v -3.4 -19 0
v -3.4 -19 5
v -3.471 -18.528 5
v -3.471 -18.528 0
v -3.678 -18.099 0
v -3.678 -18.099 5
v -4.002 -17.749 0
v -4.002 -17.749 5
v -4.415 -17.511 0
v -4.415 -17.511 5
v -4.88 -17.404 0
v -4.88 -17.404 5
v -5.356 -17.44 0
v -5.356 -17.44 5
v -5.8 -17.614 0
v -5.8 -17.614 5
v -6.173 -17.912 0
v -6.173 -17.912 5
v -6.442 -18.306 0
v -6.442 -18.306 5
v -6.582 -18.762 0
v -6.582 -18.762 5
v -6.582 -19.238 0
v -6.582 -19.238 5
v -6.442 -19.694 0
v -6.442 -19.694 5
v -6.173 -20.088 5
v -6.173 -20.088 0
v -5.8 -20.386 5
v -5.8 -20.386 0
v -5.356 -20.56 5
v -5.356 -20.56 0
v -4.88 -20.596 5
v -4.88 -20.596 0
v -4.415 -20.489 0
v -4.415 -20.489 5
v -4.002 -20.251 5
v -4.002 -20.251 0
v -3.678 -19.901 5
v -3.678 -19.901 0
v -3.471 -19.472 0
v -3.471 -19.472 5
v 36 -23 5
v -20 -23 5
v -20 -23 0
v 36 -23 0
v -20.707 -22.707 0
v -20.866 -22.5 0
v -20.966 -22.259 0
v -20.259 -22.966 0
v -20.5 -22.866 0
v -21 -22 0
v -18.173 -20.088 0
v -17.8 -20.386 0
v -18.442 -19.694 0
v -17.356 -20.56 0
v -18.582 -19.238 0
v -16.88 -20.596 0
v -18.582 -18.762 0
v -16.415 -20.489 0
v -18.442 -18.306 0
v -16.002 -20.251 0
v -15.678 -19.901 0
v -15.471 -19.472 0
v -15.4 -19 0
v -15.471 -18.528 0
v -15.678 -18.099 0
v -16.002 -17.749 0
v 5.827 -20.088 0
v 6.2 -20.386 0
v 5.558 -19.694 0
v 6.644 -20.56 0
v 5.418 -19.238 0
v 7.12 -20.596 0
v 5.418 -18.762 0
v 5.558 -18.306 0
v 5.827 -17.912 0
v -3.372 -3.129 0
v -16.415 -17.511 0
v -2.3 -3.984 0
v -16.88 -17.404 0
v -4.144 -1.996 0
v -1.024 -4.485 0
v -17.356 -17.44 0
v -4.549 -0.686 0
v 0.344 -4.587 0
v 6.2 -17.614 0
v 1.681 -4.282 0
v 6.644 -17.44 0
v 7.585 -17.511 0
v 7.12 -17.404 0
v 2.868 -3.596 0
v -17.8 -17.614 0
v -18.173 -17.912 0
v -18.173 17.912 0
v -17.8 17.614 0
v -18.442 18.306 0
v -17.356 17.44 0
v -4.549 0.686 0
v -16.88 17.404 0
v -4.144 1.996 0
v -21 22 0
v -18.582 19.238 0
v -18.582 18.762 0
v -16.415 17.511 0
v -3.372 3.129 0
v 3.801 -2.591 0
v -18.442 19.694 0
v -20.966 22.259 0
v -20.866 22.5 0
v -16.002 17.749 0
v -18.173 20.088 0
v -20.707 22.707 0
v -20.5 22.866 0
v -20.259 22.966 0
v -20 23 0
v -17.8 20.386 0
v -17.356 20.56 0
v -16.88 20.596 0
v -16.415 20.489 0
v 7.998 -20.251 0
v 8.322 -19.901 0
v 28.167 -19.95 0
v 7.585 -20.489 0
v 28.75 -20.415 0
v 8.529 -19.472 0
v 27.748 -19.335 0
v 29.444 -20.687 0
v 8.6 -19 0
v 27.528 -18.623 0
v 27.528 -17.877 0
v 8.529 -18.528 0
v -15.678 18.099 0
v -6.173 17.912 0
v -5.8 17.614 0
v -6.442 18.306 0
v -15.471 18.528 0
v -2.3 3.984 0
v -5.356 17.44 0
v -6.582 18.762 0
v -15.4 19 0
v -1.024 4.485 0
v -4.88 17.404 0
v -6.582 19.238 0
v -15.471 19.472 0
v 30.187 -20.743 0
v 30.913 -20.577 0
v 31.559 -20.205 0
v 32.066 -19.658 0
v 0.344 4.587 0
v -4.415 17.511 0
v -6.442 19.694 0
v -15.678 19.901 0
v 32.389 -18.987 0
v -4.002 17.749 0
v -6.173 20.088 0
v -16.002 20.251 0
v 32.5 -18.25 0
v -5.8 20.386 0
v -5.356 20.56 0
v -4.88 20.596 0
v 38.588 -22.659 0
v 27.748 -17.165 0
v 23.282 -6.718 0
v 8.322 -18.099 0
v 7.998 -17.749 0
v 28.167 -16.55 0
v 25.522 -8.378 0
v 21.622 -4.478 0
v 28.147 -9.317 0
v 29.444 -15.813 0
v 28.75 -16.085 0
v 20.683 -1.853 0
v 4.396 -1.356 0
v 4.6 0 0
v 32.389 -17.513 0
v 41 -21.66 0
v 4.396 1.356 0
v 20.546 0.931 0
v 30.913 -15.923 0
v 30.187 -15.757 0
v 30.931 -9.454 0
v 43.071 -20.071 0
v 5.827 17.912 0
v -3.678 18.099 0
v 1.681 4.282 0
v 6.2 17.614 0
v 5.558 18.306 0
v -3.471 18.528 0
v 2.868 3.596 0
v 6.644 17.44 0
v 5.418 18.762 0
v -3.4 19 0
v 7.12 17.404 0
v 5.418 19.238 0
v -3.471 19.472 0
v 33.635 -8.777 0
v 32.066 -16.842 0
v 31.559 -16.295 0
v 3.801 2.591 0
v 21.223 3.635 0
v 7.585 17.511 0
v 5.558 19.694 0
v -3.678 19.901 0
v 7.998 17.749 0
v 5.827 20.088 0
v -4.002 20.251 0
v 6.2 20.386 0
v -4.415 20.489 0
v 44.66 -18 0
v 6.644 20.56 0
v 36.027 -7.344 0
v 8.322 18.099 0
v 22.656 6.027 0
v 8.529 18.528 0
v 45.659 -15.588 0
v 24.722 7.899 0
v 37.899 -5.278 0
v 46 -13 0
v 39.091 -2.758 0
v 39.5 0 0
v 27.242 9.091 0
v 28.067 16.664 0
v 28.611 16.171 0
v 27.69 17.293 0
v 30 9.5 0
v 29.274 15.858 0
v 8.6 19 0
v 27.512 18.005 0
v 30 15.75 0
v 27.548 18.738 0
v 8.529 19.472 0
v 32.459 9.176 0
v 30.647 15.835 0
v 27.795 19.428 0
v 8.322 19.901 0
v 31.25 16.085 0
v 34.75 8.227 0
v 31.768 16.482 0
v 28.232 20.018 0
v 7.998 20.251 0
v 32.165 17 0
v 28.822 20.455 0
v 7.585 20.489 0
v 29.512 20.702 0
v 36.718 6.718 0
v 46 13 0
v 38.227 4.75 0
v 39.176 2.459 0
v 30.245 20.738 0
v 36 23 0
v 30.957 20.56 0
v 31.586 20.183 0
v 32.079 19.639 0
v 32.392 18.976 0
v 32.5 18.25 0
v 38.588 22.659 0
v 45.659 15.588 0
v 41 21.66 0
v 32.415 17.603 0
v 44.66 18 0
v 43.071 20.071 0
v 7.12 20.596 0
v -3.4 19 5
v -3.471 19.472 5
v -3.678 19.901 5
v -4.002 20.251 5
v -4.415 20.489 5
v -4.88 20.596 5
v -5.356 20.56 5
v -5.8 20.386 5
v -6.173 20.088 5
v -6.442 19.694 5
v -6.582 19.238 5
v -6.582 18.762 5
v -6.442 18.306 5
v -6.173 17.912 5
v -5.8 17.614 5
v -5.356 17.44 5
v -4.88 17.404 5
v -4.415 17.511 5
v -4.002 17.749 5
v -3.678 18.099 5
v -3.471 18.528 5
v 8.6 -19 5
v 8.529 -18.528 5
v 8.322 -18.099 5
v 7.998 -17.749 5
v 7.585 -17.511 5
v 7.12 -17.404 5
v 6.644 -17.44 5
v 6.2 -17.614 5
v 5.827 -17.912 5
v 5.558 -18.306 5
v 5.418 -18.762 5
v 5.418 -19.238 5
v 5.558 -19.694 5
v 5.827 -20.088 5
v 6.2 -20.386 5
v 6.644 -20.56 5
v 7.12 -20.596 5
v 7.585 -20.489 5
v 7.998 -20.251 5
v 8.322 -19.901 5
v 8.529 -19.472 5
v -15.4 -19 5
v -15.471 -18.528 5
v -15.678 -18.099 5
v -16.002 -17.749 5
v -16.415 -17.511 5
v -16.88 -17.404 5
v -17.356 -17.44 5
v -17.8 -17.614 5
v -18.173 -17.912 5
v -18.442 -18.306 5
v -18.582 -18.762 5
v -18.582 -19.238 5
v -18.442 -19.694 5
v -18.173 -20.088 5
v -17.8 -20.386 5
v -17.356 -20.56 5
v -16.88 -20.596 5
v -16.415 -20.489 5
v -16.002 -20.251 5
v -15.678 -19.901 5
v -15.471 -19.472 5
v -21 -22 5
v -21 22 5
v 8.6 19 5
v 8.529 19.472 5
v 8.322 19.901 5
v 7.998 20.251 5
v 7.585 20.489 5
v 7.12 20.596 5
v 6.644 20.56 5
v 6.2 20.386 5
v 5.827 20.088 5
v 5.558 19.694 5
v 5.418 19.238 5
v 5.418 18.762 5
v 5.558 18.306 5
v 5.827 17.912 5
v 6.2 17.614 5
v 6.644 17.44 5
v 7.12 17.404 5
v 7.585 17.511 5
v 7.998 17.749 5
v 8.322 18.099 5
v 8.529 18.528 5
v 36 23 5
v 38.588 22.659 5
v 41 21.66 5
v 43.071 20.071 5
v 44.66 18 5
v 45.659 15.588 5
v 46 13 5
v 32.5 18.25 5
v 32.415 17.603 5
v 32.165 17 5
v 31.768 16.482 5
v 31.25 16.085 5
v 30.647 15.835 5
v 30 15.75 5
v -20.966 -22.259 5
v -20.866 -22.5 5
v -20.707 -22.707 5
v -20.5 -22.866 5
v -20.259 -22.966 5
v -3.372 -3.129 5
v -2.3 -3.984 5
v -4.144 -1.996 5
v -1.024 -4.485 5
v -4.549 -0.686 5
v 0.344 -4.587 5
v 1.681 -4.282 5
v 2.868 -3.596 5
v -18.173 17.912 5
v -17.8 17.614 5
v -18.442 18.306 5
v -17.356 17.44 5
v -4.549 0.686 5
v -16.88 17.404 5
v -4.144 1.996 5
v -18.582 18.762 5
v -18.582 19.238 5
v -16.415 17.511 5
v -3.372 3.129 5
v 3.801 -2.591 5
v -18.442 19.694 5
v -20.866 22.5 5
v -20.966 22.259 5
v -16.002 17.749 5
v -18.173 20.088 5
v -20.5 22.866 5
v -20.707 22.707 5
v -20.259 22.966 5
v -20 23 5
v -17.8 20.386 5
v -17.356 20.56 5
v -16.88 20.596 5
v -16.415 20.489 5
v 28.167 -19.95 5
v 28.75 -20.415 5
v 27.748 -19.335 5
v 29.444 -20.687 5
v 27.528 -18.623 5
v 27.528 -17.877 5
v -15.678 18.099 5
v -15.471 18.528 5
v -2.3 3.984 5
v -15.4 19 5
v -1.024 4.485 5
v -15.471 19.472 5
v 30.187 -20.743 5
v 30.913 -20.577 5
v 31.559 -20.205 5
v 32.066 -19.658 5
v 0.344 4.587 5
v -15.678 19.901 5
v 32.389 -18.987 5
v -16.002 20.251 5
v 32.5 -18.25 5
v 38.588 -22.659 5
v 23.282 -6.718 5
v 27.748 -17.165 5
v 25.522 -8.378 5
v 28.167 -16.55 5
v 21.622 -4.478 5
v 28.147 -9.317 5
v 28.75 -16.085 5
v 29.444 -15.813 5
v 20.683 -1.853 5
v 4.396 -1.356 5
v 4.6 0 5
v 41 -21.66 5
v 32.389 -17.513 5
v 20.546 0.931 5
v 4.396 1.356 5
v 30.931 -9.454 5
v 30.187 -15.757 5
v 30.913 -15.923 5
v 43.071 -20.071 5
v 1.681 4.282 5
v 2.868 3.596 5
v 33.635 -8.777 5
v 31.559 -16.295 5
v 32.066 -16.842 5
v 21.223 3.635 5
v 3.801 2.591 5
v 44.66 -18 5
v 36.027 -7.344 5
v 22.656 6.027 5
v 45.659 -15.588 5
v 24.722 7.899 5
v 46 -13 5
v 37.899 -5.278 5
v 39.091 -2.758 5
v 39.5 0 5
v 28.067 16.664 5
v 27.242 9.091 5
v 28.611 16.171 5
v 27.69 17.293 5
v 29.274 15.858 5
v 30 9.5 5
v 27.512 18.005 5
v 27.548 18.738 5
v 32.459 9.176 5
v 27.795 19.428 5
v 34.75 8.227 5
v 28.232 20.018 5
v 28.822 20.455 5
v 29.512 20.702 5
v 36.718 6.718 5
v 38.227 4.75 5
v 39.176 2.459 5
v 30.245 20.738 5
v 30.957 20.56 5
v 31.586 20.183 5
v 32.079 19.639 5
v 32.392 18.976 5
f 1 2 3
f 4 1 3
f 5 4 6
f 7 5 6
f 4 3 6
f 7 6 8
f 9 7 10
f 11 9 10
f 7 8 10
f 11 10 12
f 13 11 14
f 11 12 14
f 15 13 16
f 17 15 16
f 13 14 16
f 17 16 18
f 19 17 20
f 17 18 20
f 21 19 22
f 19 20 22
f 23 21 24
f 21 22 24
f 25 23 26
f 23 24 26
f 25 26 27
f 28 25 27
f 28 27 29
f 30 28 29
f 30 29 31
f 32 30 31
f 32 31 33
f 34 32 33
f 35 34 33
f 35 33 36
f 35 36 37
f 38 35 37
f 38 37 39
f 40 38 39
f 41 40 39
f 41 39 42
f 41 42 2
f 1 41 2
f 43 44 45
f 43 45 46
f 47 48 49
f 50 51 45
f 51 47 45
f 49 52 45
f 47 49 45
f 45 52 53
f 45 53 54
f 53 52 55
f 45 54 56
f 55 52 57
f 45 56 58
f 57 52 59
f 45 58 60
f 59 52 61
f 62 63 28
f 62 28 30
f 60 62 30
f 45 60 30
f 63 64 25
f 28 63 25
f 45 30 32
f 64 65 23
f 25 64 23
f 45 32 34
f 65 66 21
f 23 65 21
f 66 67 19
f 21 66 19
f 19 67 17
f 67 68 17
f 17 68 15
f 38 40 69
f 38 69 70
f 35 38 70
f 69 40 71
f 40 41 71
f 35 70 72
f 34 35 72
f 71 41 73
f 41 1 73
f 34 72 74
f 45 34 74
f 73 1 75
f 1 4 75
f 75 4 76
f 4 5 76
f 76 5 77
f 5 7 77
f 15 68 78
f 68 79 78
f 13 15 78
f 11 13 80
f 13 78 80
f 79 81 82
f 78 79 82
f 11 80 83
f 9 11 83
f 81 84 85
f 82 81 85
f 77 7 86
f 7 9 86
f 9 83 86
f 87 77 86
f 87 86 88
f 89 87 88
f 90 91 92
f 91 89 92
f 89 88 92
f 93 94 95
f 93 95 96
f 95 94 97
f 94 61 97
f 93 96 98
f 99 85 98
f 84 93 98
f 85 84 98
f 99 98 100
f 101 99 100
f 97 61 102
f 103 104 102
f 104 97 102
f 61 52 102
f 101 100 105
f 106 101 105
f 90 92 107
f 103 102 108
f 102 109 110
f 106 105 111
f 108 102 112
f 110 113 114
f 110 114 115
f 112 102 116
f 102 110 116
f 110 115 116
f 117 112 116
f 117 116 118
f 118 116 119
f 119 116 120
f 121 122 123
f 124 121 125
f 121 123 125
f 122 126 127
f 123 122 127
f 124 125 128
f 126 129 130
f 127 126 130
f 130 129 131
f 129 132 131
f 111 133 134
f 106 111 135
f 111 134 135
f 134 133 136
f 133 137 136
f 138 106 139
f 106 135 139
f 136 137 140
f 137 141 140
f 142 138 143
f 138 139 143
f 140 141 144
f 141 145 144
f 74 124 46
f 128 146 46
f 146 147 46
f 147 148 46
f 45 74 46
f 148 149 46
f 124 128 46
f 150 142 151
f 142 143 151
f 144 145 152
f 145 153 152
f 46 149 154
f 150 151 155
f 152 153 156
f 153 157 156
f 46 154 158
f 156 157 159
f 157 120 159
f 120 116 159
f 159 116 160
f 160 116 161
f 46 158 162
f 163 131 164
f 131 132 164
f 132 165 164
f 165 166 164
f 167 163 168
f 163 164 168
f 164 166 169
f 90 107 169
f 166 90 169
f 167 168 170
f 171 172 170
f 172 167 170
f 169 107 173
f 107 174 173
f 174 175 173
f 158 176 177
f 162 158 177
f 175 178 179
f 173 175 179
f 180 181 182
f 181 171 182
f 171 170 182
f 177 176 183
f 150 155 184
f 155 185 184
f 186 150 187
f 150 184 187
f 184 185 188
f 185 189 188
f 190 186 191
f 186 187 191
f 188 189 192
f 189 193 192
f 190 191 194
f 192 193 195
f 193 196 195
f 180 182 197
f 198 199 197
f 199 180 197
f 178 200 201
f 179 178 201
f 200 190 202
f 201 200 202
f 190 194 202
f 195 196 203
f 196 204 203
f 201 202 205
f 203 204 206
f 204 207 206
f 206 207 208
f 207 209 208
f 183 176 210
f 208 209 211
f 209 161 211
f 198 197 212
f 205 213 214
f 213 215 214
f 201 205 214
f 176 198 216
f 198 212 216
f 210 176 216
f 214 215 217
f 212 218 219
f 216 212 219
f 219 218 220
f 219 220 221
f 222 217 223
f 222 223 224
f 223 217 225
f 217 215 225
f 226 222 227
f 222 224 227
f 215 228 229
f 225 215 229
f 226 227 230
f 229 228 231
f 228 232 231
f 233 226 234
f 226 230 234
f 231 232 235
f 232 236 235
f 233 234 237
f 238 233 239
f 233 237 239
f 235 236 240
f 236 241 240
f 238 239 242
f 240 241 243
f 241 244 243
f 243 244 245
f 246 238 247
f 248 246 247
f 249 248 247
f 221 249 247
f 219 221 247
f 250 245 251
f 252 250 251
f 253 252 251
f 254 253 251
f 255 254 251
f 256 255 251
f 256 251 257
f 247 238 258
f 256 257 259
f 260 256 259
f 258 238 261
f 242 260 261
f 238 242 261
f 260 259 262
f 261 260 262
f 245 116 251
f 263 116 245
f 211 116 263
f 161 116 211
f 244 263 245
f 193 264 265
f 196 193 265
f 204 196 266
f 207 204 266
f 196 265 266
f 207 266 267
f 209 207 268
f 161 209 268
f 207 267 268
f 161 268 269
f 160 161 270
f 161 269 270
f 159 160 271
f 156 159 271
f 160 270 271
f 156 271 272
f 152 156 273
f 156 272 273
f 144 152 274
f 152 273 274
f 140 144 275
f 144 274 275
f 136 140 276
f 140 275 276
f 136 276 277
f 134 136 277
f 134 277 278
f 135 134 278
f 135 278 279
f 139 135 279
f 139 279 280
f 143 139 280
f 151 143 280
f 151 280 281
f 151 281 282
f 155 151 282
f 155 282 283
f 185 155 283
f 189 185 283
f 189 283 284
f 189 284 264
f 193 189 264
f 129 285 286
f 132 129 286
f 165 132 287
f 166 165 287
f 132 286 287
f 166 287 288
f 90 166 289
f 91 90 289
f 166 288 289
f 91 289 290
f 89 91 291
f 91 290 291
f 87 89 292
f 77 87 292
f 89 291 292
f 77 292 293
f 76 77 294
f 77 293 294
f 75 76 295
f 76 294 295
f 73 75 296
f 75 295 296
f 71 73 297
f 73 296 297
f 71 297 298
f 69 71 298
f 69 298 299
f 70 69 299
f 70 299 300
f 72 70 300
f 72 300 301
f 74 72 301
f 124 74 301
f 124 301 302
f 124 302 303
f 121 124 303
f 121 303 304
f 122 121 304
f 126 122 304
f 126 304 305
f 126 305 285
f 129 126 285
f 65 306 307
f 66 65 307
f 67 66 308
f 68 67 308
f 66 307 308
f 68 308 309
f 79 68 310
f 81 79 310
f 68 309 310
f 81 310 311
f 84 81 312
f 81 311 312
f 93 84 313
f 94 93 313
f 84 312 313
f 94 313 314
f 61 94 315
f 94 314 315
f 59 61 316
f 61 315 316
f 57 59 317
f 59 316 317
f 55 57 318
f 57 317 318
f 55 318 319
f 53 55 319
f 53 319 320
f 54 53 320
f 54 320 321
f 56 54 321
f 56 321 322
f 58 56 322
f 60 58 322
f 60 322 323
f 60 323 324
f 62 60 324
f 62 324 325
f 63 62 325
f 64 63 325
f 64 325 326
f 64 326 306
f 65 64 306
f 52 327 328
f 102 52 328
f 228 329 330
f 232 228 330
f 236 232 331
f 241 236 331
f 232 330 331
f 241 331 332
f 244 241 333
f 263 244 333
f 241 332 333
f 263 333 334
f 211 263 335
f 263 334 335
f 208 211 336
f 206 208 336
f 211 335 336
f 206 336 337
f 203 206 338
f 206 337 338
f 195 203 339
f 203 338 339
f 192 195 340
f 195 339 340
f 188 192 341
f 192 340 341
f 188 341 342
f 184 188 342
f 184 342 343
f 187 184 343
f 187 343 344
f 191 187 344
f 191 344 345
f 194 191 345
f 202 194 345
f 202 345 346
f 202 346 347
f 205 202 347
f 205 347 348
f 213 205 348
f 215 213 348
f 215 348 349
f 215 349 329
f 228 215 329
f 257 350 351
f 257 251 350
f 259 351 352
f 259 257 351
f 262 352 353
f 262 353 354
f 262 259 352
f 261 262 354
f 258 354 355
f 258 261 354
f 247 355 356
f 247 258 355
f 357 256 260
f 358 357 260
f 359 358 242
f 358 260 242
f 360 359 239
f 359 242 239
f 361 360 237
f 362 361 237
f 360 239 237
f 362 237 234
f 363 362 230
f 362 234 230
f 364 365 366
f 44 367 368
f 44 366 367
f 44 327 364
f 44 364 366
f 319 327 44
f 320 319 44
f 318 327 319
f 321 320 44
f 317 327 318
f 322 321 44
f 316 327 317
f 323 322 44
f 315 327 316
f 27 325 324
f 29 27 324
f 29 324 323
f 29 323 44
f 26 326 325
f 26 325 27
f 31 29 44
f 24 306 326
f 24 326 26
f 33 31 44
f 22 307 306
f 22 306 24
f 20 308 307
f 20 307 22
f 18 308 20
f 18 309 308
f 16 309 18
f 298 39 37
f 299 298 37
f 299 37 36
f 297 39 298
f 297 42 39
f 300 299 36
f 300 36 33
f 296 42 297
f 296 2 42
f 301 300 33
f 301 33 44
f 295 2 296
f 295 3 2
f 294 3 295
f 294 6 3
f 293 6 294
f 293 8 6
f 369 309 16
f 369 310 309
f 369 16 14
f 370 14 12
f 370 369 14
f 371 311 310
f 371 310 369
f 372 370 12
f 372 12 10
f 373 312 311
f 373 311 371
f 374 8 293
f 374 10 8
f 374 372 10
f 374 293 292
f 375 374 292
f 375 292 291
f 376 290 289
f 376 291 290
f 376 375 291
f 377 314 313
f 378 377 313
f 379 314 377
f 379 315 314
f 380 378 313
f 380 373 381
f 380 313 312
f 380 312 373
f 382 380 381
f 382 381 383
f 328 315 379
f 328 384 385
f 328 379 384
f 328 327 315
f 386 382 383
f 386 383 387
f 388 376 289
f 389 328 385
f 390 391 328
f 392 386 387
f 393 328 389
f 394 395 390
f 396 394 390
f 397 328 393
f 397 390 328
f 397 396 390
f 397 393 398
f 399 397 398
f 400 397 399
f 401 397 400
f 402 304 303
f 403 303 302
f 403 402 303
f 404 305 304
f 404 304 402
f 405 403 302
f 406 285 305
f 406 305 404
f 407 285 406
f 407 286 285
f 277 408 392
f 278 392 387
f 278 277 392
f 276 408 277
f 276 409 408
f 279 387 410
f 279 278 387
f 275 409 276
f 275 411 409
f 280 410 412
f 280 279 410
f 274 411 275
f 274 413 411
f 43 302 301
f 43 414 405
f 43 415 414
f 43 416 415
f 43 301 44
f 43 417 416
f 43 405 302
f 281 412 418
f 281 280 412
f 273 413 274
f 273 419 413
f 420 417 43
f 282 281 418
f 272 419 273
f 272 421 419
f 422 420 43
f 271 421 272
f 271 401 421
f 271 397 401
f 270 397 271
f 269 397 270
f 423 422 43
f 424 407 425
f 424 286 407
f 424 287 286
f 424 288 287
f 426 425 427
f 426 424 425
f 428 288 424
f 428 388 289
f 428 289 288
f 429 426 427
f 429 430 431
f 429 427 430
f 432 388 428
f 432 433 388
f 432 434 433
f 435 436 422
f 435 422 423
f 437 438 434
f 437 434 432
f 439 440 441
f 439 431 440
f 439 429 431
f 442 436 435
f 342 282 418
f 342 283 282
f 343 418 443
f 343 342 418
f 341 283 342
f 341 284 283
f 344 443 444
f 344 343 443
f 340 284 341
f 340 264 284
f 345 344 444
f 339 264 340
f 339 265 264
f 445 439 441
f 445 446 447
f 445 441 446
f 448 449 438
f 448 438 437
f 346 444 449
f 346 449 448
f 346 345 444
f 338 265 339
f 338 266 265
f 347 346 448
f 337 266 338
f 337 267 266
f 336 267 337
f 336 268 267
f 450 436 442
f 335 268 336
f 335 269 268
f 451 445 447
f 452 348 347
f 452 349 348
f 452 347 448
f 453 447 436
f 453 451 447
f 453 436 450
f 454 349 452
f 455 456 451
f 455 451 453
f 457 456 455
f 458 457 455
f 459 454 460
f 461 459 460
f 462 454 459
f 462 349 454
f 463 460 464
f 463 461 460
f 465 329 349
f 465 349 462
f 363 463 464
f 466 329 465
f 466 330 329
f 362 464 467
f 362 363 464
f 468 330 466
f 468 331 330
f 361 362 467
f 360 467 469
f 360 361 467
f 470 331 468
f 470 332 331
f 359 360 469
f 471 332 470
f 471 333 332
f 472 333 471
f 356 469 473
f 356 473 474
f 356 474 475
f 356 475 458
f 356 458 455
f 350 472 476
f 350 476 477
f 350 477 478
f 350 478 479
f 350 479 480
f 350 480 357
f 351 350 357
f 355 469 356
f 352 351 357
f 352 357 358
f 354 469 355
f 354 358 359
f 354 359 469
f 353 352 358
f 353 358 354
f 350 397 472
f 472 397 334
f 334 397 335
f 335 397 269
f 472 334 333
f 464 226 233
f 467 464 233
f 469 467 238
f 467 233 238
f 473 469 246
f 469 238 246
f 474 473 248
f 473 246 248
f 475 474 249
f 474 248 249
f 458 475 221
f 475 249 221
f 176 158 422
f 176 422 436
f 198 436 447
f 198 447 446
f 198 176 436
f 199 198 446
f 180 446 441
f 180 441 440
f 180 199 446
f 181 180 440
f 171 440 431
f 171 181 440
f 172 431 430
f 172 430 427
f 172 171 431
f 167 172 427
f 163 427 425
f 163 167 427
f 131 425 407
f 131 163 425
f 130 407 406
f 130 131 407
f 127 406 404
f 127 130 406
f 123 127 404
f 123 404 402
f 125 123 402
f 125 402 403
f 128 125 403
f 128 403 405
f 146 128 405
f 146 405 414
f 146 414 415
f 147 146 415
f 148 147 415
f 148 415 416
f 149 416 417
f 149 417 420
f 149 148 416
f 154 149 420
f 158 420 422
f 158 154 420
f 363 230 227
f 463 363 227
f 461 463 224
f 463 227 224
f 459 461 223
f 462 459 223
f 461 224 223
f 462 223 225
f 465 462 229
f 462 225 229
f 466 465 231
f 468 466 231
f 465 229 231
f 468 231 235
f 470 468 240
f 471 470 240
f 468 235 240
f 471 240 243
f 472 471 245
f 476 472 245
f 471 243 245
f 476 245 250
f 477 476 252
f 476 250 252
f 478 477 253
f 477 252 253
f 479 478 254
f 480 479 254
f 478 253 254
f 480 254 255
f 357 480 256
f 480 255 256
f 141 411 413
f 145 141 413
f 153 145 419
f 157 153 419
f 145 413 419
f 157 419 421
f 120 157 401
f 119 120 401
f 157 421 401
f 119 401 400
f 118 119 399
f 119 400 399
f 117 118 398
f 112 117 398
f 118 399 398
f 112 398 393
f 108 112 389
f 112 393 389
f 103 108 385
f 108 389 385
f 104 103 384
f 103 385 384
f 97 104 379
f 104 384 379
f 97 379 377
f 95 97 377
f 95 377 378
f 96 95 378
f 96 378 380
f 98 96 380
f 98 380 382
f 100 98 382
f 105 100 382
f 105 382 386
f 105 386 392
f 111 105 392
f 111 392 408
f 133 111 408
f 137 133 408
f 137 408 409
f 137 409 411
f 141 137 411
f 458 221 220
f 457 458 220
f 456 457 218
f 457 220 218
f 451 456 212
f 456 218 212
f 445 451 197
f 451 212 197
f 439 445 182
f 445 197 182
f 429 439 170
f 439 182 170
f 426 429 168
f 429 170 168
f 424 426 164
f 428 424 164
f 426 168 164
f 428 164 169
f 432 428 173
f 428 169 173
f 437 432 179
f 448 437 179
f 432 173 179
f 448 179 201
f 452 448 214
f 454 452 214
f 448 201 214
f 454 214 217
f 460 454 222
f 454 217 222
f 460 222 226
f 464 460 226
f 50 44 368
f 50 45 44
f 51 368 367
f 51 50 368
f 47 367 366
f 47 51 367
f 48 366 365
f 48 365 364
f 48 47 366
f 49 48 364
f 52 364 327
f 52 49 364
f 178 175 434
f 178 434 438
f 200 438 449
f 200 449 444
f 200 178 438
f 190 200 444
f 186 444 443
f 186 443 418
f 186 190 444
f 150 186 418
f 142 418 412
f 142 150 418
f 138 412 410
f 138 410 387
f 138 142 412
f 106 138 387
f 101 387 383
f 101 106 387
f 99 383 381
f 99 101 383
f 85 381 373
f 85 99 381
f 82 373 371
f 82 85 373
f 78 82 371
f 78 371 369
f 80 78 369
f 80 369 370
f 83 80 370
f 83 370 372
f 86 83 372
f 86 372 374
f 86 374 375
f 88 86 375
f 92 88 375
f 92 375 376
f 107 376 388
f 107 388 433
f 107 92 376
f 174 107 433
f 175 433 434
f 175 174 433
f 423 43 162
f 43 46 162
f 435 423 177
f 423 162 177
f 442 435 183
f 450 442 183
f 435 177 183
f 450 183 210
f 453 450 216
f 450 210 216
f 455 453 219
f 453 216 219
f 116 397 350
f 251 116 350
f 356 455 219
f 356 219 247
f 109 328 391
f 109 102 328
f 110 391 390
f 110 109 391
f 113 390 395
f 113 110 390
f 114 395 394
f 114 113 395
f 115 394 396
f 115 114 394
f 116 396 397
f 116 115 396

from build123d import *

# Parameters (mm, degrees)
SKETCH1_W           = 65
SKETCH1_H           = 46
SKETCH1_R           = 4.6
SKETCH1_R_2         = 2.5
BOSS_EXTRUDE1_DEPTH = 5
SKETCH2_R           = 1.6
CUT_EXTRUDE1_DEPTH  = 10
SKETCH3_W           = 4
SKETCH3_H           = 46
CUT_EXTRUDE2_DEPTH  = 6
SKETCH4_W           = 6
SKETCH4_H           = 46
BOSS_EXTRUDE2_DEPTH = 5
FILLET1_R           = 10
FILLET2_R           = 1


with BuildPart() as part:
    # Sketch1 → Boss-Extrude1 (new body)
    with BuildSketch(Plane.XY):
        with Locations((7.5, 0)):
            Rectangle(SKETCH1_W, SKETCH1_H)
        Circle(SKETCH1_R, mode=Mode.SUBTRACT)
        with Locations((30, -18.25)):
            Circle(SKETCH1_R_2, mode=Mode.SUBTRACT)
        with BuildLine():
            ThreePointArc((39.5, 0), (23.282485579, -6.717514421), (30, 9.5))
            ThreePointArc((30, 9.5), (36.717514421, 6.717514421), (39.5, 0))
        make_face(mode=Mode.SUBTRACT)
        with BuildLine():
            ThreePointArc((32.5, 18.25), (31.767766953, 16.482233047), (30, 15.75))
            ThreePointArc((30, 15.75), (28.232233047, 20.017766953), (32.5, 18.25))
        make_face(mode=Mode.SUBTRACT)
    extrude(amount=BOSS_EXTRUDE1_DEPTH)

    # Sketch2 → Cut-Extrude1 (cut)
    with BuildSketch(Plane.XY.offset(5)):
        with Locations((7, 19)):
            Circle(SKETCH2_R)
        with Locations((-5, -19)):
            Circle(SKETCH2_R)
        with Locations((-17, 19)):
            Circle(SKETCH2_R)
        with Locations((-5, 19)):
            Circle(SKETCH2_R)
        with Locations((7, -19)):
            Circle(SKETCH2_R)
        with Locations((-17, -19)):
            Circle(SKETCH2_R)
    extrude(amount=-CUT_EXTRUDE1_DEPTH, mode=Mode.SUBTRACT)

    # Sketch3 → Cut-Extrude2 (cut, through all)
    with BuildSketch(Plane.XY.offset(5)):
        with Locations((-23, 0)):
            Rectangle(SKETCH3_W, SKETCH3_H)
    extrude(amount=-CUT_EXTRUDE2_DEPTH, mode=Mode.SUBTRACT)

    # Sketch4 → Boss-Extrude2 (add)
    with BuildSketch(Plane.XY.offset(5)):
        with Locations((43, 0)):
            Rectangle(SKETCH4_W, SKETCH4_H)
    extrude(amount=-BOSS_EXTRUDE2_DEPTH)

    # Fillet1
    fillet1_edges = [part.edges().sort_by_distance(p)[0] for p in [
        (46, -23, 2.5),
        (46, 23, 2.5),
    ]]
    fillet(fillet1_edges, radius=FILLET1_R)

    # Fillet2
    fillet2_edges = [part.edges().sort_by_distance(p)[0] for p in [
        (-21, 23, 2.5),
        (-21, -23, 2.5),
    ]]
    fillet(fillet2_edges, radius=FILLET2_R)


solid = part.part
